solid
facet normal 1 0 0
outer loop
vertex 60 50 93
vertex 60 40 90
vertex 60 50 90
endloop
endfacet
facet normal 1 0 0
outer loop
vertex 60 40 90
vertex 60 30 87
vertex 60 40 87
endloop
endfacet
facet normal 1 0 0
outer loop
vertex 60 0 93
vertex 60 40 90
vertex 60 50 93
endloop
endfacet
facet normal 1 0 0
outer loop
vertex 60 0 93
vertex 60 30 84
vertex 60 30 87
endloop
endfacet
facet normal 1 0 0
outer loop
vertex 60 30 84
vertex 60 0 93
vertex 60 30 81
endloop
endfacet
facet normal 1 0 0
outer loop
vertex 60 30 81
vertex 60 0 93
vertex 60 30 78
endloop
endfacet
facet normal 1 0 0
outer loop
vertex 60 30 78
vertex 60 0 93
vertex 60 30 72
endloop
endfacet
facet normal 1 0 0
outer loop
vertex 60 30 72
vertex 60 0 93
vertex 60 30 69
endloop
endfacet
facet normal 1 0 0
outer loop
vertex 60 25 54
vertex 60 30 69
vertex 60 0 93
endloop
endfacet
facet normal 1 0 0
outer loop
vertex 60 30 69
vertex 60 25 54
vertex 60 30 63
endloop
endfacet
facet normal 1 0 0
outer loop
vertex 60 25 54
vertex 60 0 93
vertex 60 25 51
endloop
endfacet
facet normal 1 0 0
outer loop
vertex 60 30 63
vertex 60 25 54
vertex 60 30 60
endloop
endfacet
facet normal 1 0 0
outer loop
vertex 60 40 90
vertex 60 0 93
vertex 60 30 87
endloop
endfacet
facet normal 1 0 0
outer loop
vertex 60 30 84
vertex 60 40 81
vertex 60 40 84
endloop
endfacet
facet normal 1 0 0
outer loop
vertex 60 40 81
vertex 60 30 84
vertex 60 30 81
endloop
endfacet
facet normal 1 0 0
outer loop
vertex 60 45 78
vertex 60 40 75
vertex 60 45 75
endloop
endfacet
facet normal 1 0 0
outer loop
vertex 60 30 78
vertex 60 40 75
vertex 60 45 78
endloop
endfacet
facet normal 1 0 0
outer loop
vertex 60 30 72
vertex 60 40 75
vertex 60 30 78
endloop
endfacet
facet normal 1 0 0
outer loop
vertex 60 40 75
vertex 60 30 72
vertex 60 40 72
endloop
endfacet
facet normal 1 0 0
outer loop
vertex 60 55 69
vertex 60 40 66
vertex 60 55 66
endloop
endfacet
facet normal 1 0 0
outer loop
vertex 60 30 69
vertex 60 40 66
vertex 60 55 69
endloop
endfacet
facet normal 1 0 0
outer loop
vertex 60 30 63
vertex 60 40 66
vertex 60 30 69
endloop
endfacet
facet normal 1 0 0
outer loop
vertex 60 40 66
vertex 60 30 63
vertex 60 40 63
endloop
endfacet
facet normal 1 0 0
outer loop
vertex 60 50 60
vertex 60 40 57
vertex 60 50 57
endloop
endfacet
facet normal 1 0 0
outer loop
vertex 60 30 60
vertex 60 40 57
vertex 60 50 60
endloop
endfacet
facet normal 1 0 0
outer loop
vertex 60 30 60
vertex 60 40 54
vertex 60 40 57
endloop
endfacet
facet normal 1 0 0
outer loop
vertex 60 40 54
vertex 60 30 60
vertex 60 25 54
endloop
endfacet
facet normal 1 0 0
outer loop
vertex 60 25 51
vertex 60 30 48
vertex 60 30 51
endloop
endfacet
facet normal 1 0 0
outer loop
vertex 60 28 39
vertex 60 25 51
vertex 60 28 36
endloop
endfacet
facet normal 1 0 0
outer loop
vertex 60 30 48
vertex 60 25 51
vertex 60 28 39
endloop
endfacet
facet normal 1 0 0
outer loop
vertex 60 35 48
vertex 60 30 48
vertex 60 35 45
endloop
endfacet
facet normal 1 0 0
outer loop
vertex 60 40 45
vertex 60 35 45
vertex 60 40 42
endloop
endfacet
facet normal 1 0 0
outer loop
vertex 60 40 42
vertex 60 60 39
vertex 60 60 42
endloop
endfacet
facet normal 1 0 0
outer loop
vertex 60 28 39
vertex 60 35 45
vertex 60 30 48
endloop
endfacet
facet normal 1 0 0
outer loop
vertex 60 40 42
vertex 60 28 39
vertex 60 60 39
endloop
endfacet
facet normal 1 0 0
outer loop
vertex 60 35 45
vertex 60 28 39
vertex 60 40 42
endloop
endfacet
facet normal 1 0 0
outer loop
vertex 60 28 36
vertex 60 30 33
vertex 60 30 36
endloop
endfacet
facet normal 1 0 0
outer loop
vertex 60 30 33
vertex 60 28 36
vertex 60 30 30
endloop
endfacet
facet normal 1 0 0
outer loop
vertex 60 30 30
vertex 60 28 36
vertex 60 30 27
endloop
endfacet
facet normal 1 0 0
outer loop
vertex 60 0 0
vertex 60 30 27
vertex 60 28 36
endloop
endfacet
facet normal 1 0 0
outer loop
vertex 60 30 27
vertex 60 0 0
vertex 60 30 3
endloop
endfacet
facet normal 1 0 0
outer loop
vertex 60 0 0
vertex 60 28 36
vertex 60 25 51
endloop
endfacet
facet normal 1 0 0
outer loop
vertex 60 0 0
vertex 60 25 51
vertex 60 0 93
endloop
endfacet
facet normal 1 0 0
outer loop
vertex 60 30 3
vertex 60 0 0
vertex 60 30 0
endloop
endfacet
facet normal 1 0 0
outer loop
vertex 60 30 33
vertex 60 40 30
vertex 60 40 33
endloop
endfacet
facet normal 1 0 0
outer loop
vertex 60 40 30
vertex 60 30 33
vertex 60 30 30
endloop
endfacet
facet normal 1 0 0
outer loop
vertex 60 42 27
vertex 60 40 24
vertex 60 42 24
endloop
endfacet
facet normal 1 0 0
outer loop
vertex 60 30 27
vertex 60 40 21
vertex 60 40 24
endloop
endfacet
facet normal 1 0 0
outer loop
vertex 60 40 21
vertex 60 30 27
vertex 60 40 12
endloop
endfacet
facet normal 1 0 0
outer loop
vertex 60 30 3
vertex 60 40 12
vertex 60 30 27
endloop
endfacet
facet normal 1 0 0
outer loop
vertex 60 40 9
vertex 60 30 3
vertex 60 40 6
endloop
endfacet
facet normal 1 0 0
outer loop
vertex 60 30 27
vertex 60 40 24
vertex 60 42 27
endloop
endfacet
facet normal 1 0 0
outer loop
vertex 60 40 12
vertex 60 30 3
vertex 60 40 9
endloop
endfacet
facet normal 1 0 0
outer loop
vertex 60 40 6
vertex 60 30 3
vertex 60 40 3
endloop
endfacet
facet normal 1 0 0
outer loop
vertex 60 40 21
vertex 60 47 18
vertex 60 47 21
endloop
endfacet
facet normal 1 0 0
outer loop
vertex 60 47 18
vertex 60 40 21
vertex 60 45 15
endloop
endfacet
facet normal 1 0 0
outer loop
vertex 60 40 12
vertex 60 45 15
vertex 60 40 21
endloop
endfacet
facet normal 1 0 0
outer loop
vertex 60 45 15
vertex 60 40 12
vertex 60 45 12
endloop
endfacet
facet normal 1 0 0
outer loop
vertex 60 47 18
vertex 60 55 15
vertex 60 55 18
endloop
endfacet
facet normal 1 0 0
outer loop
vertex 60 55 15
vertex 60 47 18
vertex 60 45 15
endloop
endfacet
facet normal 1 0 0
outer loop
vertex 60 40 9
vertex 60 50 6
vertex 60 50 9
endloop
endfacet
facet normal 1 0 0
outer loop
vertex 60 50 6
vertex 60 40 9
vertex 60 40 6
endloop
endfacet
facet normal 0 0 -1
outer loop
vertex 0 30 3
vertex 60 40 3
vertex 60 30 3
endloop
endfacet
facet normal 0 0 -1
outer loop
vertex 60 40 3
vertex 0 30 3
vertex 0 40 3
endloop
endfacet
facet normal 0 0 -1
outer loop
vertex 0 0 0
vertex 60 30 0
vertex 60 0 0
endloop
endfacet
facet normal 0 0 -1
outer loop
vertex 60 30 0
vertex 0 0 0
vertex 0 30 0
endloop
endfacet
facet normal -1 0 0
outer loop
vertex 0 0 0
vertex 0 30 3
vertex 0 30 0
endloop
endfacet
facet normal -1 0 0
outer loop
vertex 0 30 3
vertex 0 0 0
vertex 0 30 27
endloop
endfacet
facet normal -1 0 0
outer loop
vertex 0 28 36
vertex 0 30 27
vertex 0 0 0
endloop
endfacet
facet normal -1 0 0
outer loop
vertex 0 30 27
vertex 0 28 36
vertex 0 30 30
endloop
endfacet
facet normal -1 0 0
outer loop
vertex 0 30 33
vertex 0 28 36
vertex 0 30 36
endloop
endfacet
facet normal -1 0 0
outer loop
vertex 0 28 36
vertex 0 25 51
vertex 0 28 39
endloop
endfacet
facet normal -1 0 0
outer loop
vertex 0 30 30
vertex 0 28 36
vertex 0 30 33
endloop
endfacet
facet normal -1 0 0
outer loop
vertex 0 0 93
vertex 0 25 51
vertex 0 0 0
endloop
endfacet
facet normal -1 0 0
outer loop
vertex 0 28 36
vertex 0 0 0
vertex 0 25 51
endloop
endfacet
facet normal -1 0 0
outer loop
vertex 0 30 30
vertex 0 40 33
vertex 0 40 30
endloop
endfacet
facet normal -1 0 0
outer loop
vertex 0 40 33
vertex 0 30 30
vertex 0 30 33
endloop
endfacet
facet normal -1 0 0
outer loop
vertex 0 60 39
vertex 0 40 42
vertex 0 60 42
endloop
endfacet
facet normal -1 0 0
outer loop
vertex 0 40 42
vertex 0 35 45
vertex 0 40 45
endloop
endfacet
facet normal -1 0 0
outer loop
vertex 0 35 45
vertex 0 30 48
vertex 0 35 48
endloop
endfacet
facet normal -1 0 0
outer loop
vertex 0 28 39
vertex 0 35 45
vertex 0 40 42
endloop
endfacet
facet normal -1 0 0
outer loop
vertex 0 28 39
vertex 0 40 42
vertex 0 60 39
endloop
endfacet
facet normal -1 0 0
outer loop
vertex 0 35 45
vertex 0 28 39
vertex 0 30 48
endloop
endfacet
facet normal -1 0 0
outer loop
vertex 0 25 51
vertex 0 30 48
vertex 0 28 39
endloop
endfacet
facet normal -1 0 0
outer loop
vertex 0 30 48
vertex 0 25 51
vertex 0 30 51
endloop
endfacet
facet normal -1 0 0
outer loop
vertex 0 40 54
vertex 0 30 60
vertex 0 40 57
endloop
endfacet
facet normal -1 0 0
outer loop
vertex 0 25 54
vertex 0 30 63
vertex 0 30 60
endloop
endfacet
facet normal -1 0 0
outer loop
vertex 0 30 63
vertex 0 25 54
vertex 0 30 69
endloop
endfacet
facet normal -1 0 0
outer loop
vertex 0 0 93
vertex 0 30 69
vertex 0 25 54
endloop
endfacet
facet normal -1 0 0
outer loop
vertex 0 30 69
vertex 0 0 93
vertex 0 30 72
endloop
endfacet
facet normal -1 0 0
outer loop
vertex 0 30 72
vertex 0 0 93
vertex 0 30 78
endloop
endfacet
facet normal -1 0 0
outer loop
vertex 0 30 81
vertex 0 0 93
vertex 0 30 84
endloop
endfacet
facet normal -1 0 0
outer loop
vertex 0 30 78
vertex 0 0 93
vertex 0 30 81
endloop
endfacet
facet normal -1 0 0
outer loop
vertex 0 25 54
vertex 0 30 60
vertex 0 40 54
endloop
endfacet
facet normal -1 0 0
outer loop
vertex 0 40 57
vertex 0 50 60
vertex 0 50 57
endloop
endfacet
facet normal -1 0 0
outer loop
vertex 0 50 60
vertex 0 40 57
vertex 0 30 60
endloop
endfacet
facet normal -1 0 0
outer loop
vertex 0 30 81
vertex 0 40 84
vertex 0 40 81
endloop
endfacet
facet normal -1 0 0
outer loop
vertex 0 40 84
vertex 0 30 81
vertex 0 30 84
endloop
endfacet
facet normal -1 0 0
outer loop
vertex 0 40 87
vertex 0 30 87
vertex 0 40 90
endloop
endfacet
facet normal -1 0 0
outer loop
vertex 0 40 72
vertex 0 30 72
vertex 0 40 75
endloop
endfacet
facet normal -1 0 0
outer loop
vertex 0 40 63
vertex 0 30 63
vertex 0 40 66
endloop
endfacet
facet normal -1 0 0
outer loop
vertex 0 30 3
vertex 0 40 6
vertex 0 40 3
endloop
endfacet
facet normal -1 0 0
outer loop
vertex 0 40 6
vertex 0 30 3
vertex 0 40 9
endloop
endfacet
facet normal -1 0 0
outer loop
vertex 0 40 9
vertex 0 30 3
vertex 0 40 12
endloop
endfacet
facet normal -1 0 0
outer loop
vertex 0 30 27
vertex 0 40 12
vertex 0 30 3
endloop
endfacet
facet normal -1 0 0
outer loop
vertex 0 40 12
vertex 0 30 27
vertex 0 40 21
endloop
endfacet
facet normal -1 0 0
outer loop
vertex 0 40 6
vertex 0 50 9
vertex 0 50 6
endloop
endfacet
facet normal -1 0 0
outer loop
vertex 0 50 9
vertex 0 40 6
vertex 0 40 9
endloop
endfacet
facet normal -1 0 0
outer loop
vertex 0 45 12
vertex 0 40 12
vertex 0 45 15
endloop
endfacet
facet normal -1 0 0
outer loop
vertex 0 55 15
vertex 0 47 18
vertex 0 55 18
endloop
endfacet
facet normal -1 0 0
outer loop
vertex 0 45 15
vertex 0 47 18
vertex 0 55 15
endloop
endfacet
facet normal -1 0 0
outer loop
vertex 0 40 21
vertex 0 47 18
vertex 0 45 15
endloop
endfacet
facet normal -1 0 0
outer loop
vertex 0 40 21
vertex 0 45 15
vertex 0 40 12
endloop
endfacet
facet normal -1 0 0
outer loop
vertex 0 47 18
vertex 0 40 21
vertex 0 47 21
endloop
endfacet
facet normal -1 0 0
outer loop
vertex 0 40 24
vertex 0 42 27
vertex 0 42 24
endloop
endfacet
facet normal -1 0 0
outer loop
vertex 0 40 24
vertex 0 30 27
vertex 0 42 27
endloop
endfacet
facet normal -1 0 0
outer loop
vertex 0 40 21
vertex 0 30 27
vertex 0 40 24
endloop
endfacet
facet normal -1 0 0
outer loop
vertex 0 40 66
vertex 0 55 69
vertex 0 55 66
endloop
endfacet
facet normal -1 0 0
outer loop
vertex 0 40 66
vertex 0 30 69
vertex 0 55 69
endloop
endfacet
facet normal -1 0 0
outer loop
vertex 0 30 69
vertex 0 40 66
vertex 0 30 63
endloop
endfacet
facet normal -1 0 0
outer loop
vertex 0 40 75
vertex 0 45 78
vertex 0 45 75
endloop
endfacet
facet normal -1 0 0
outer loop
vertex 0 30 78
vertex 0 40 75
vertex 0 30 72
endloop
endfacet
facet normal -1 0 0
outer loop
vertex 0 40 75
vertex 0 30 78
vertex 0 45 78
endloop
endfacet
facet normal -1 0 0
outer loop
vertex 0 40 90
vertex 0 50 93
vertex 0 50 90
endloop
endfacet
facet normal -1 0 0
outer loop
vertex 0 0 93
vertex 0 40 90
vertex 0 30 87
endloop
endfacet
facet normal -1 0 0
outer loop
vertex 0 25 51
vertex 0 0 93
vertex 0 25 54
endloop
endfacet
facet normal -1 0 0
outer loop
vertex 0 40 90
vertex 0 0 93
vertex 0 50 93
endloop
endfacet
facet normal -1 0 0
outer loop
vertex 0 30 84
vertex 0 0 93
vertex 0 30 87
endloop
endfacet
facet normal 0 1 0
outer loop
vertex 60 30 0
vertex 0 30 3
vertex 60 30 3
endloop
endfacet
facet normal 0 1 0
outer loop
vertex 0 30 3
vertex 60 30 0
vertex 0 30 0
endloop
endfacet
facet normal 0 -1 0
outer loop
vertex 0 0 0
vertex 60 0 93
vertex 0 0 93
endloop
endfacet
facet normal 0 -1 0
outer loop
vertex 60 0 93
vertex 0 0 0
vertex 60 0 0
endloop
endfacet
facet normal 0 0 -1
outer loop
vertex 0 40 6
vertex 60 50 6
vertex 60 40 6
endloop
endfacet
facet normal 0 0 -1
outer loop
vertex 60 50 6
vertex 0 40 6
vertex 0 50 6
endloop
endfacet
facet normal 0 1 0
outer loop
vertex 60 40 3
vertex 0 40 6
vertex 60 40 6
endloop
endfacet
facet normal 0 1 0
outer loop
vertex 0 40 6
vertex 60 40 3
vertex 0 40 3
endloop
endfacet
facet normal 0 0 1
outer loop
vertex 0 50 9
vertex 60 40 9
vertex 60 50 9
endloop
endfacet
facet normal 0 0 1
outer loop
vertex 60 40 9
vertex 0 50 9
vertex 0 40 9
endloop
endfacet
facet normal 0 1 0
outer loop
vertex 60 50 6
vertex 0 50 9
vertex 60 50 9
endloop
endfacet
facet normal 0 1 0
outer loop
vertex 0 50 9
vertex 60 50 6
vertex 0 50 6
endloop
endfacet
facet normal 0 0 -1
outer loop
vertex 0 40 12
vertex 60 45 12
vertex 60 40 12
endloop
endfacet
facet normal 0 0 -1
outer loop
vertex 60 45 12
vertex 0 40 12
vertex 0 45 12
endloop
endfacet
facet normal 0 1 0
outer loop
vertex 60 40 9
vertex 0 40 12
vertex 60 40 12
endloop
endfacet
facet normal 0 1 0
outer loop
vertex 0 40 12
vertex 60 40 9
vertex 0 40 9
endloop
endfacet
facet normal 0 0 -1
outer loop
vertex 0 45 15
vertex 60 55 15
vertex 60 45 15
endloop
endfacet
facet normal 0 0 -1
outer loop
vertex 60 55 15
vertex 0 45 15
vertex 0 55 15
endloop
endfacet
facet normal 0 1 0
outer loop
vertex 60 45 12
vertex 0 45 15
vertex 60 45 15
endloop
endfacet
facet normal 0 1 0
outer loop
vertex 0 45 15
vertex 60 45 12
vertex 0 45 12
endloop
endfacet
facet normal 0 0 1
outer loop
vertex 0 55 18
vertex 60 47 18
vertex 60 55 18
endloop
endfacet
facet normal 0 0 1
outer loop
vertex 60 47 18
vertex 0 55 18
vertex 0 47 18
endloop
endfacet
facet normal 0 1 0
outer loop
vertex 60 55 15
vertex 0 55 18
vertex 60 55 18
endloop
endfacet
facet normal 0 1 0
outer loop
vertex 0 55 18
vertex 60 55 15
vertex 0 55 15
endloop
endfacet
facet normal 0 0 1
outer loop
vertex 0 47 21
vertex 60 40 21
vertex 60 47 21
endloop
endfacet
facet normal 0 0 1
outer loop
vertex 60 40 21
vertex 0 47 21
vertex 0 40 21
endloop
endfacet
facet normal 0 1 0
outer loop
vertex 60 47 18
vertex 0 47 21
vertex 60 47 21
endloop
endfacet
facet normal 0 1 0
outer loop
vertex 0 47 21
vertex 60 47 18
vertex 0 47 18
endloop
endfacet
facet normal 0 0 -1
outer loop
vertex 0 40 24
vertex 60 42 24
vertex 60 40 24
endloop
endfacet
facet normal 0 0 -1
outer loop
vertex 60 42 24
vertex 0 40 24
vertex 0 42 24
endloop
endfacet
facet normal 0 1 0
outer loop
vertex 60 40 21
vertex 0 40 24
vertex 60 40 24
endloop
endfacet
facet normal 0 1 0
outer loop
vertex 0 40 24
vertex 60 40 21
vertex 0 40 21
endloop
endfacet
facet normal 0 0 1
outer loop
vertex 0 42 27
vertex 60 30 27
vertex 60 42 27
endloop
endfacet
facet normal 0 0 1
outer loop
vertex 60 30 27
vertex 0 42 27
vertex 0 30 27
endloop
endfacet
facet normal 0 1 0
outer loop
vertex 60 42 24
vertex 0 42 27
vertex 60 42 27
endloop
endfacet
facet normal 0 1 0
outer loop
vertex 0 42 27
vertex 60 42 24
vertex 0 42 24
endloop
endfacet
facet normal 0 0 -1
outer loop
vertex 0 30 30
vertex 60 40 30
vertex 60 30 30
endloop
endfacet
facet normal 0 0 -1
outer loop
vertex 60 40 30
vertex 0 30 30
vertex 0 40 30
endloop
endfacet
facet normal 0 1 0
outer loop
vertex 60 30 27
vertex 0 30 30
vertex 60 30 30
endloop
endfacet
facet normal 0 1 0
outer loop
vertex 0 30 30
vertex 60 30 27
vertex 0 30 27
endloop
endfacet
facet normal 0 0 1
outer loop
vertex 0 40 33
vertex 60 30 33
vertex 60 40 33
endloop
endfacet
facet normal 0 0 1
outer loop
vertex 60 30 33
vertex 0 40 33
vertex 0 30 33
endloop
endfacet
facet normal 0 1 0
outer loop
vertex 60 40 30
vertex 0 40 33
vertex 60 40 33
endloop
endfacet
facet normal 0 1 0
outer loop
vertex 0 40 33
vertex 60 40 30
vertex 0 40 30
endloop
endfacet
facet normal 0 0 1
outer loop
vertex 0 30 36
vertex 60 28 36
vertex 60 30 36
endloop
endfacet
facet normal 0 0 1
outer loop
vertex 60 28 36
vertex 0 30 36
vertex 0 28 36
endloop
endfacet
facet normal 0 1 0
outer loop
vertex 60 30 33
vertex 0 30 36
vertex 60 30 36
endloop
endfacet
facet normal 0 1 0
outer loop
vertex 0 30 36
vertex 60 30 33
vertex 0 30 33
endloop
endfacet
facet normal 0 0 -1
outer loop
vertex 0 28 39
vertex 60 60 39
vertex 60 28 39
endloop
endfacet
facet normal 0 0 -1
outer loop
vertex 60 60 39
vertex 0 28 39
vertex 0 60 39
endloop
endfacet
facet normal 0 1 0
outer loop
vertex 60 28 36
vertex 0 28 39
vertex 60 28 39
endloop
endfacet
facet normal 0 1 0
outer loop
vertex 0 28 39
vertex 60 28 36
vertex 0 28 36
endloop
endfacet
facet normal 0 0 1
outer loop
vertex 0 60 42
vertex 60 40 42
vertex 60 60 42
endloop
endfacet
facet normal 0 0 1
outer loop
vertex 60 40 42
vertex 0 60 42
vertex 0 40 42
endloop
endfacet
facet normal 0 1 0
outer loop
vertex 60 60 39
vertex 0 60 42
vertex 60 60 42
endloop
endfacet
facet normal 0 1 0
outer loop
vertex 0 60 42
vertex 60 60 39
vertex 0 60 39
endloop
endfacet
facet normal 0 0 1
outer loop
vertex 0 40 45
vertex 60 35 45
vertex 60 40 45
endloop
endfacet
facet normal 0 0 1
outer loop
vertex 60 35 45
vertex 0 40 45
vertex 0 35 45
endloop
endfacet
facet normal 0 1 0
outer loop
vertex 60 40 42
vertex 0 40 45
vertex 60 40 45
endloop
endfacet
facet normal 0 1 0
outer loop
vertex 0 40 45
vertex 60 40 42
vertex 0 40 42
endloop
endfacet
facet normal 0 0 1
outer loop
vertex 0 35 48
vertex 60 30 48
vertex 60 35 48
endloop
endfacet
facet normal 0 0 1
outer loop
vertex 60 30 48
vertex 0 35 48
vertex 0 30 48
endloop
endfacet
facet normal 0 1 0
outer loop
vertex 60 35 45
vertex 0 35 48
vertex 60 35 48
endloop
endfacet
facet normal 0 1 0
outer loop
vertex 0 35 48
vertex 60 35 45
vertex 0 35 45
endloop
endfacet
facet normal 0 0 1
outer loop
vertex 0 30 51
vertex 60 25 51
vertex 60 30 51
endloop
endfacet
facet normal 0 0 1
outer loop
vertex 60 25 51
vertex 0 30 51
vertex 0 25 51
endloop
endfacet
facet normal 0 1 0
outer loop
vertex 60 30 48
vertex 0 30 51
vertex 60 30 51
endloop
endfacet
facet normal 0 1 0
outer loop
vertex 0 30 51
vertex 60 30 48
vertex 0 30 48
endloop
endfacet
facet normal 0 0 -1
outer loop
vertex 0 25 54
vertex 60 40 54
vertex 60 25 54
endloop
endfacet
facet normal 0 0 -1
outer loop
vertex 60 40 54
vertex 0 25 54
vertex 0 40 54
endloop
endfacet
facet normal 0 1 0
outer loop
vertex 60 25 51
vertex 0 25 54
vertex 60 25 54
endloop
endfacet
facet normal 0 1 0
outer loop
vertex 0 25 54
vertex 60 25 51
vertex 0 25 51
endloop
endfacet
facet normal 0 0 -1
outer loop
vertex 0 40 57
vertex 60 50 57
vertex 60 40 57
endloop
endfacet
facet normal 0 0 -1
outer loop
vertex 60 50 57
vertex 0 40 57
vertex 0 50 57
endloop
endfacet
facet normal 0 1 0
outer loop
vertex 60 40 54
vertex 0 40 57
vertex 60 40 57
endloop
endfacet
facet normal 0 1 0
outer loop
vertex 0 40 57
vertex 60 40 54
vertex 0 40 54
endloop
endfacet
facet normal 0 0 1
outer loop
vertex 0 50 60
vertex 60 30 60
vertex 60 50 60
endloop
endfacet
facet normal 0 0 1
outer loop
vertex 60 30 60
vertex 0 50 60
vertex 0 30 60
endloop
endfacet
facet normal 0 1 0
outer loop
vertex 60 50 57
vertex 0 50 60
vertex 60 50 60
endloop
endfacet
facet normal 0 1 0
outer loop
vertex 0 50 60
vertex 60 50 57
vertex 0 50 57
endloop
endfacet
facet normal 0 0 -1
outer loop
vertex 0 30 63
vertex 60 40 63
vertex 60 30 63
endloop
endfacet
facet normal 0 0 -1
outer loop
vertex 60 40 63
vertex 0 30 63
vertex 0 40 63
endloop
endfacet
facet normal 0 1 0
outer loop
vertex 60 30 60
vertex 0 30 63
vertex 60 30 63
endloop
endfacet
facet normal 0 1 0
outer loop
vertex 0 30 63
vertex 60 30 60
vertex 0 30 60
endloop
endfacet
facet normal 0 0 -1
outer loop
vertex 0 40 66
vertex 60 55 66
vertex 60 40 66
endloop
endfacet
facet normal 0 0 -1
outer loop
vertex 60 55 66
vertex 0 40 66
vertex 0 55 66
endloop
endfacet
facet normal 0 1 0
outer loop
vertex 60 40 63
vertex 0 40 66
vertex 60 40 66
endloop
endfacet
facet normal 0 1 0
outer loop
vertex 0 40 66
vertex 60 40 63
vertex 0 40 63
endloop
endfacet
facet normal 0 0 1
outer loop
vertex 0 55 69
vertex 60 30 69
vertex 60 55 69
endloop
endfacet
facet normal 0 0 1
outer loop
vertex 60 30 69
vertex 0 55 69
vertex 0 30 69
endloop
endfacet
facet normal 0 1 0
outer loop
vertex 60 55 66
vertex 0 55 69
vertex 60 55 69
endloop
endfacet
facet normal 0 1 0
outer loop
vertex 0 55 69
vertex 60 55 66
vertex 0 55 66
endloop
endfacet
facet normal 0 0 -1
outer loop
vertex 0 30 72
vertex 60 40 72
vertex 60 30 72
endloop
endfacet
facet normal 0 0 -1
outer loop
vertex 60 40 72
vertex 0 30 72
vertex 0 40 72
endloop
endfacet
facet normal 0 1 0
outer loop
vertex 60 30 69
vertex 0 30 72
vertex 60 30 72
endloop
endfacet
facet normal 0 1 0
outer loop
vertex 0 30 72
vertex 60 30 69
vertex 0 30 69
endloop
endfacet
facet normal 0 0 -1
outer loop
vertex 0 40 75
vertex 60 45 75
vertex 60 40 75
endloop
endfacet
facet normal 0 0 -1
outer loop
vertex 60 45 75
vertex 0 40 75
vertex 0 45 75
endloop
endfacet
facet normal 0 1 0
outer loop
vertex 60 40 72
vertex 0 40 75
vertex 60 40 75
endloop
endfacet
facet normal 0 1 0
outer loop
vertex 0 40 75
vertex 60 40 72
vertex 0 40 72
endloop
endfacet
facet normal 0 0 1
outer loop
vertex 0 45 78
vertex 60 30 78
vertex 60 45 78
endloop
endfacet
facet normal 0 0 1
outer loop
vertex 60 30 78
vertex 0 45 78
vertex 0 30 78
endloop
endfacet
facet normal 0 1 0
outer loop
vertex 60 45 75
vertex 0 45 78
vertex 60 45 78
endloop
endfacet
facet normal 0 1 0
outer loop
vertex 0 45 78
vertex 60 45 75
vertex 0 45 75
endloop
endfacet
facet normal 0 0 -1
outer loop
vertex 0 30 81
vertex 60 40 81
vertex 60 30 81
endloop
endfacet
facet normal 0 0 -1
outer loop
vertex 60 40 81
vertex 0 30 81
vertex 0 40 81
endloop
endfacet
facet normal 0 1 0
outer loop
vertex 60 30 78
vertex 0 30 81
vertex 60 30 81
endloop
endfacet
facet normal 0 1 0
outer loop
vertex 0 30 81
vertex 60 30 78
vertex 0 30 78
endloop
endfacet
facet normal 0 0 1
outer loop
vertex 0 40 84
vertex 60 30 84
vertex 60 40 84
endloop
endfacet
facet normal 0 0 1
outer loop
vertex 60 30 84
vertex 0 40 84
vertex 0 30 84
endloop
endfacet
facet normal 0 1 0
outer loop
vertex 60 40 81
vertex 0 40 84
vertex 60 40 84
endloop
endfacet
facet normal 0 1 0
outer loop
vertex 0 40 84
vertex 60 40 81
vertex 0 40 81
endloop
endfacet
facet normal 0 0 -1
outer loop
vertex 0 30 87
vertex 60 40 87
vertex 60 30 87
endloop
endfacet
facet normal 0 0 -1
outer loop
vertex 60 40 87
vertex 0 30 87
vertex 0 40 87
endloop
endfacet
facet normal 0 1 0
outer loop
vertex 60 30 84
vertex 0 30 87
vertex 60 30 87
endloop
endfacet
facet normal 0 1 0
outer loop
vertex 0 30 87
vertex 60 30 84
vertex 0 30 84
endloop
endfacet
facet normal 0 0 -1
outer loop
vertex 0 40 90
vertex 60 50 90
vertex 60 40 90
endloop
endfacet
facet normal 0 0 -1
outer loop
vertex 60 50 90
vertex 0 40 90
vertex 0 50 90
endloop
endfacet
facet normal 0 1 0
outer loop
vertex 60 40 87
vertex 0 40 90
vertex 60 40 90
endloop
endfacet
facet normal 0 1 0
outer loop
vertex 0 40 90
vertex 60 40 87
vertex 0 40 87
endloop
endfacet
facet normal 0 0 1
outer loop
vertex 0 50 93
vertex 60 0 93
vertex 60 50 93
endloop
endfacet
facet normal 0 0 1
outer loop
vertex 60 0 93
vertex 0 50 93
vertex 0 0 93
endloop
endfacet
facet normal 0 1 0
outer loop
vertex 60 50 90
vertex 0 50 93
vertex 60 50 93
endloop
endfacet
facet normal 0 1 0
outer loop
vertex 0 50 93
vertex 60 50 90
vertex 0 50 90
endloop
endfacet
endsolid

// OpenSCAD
// #948 - vertical skyline
// Author: RJ Duran (rjduranjr@gmail.com)
// Date: 2025.01.07

// 31 layers of rectangles stacked

width = 60;
layer_height = 3;
depth = [
30, 40, 50, 40, 45, 55, 47, 40, 42, 30,
40, 30, 28, 60, 40, 35, 30, 25, 40, 50,
30, 40, 55, 30, 40, 45, 30, 40, 30, 40, 50
];
    
for(i = [0 : 1 : len(depth)-1]){
    translate([0,0,layer_height*i])
        cube([width,depth[i],layer_height]);
}
